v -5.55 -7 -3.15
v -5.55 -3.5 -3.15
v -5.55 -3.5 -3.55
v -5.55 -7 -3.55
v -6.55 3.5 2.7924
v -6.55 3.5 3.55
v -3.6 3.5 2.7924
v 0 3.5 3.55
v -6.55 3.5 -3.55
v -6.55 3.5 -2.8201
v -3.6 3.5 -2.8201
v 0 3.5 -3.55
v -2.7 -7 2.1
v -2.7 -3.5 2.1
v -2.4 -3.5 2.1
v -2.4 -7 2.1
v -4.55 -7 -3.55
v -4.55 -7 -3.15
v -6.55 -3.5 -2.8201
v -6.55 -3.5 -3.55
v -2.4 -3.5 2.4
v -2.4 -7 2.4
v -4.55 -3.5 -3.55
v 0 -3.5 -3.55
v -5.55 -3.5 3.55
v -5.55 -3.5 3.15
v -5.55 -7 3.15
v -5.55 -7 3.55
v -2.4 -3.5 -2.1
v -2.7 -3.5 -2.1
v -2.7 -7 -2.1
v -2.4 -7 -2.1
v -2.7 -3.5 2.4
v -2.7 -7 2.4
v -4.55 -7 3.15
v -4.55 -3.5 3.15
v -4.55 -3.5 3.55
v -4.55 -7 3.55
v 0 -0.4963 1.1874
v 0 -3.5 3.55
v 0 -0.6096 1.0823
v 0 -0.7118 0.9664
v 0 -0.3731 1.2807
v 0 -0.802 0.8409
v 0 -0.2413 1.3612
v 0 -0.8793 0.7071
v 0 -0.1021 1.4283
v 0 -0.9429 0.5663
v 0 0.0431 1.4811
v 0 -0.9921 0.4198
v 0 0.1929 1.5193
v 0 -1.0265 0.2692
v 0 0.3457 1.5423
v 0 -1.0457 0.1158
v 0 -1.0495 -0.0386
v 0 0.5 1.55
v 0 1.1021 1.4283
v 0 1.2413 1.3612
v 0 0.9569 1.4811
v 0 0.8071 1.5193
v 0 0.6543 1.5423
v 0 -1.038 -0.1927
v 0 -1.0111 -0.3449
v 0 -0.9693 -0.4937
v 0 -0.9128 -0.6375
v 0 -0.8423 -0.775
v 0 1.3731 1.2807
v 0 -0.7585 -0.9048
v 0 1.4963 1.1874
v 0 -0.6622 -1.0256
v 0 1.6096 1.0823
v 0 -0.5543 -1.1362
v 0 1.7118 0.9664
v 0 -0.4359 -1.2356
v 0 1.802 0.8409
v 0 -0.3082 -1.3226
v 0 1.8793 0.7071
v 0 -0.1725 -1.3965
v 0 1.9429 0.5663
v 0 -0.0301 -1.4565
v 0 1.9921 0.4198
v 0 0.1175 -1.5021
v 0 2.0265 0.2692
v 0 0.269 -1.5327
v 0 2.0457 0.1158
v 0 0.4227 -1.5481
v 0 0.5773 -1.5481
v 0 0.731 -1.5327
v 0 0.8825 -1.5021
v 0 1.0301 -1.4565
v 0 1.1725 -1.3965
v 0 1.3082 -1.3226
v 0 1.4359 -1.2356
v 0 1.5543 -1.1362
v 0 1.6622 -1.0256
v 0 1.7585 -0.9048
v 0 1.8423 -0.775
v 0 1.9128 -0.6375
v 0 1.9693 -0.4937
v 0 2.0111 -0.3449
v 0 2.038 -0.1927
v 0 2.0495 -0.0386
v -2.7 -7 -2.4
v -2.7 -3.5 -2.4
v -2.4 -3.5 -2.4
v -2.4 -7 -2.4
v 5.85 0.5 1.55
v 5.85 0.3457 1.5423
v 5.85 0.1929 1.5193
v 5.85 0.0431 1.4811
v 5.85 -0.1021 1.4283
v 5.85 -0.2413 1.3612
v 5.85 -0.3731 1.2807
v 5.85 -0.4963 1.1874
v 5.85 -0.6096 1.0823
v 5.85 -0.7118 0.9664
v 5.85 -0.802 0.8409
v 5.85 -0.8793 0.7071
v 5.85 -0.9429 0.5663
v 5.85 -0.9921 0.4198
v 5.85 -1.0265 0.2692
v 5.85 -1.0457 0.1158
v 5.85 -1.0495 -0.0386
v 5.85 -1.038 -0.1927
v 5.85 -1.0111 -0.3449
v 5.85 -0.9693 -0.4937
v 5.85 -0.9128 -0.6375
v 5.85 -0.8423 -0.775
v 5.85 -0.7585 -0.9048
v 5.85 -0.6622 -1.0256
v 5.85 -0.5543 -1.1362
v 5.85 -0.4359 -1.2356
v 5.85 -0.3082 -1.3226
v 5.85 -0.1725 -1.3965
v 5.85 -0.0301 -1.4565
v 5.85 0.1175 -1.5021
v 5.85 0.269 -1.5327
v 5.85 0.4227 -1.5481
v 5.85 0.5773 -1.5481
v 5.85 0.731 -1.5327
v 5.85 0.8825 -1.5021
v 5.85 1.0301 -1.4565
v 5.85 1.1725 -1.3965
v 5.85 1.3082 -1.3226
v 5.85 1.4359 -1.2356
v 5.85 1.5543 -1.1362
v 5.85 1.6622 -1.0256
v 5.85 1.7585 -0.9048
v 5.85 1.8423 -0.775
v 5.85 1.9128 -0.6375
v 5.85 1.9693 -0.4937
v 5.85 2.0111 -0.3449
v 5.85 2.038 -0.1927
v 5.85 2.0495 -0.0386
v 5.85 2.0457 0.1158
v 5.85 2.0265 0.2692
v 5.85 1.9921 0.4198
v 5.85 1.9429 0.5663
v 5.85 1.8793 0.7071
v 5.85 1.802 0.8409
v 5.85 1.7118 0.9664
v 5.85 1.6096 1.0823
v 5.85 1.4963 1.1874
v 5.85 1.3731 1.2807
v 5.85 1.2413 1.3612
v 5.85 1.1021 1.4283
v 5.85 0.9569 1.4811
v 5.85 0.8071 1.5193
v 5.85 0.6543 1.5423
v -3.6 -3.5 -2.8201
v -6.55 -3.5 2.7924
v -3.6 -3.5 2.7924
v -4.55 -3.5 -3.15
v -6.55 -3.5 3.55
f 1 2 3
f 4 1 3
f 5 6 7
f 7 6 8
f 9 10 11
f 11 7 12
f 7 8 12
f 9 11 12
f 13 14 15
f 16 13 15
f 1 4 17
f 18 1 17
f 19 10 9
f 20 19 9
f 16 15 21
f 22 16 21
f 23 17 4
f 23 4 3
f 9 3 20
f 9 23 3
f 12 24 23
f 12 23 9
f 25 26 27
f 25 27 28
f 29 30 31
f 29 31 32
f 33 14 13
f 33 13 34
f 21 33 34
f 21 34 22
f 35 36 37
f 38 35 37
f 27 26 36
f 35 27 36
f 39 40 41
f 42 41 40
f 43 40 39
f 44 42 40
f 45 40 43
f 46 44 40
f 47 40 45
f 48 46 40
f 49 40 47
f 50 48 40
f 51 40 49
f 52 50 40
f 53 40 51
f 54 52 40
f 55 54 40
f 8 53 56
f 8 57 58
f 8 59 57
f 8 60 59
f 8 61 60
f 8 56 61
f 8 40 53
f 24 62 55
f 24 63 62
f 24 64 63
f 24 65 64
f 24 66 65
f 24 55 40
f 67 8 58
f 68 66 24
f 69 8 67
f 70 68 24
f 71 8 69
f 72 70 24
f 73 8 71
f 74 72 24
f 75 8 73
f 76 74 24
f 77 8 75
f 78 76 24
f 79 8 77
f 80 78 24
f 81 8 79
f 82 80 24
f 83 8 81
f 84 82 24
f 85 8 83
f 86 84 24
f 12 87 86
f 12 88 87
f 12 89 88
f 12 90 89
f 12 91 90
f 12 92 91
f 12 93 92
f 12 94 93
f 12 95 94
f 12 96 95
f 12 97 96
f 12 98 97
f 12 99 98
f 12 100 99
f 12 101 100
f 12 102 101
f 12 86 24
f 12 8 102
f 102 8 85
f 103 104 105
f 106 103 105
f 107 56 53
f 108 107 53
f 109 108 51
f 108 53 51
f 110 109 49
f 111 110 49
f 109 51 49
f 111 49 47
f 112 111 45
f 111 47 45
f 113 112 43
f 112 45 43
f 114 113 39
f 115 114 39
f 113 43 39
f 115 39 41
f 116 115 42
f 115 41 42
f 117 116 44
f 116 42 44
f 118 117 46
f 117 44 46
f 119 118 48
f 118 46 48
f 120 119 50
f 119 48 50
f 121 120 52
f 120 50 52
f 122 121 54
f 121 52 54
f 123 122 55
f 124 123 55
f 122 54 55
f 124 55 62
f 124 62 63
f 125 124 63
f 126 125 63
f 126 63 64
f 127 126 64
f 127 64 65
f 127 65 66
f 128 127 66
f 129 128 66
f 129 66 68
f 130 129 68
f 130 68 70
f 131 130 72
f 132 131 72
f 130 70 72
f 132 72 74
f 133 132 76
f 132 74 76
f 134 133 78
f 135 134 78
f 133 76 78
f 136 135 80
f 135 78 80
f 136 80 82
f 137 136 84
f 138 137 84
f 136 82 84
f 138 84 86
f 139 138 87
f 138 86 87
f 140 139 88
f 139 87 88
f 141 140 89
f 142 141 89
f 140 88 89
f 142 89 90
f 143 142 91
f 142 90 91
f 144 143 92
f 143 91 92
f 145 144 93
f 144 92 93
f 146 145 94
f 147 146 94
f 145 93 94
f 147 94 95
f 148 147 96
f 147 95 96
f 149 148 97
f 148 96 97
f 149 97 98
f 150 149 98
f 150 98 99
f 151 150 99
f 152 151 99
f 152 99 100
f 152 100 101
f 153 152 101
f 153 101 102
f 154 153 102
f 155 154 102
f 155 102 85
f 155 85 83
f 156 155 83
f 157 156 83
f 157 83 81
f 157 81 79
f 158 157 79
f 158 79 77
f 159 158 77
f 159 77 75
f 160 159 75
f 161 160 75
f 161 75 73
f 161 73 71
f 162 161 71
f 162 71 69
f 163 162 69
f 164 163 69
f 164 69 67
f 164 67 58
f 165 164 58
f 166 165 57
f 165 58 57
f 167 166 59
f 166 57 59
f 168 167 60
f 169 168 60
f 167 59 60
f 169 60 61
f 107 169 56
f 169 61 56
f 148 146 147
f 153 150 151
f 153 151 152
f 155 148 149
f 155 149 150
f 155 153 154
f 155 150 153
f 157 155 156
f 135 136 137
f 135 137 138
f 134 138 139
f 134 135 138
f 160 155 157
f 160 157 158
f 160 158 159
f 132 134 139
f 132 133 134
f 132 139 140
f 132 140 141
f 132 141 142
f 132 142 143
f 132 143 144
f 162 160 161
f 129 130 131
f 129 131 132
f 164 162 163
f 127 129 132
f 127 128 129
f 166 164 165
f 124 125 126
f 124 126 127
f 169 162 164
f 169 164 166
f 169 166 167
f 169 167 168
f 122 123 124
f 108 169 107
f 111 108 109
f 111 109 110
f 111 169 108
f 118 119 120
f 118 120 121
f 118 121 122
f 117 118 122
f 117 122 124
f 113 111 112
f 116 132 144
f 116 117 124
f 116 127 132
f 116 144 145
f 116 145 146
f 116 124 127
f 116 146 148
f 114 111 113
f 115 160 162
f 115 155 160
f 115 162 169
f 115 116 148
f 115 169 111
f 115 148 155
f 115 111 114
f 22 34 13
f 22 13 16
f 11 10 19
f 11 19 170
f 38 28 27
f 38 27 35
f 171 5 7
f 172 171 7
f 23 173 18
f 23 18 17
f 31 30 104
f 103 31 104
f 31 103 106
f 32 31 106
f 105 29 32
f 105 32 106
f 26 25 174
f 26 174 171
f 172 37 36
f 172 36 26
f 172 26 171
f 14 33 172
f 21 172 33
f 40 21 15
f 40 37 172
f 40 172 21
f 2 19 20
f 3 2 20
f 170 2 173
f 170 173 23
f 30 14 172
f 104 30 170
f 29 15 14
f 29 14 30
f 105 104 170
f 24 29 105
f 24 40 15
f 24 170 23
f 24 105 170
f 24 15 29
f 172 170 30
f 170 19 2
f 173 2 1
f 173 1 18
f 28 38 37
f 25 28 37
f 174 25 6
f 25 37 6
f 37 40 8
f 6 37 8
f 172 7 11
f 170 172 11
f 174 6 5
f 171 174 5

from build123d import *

# Parameters (mm, degrees)
SKETCH1_W           = 7.1
SKETCH1_H           = 7
BOSS_EXTRUDE1_DEPTH = 6.55
SKETCH2_W           = 0.3
SKETCH2_H           = 0.3
SKETCH2_W_2         = 1
SKETCH2_H_2         = 0.4
BOSS_EXTRUDE2_DEPTH = 3.5
SKETCH3_W           = 2.95
SKETCH3_H           = 5.612486488
CUT_EXTRUDE1_DEPTH  = 13.874587372
SKETCH4_R           = 1.55
BOSS_EXTRUDE3_DEPTH = 5.85


with BuildPart() as part:
    # Sketch1 → Boss-Extrude1 (new body)
    with BuildSketch(Plane(origin=(0, 0, 0), x_dir=(0, 0, -1), z_dir=(1, 0, 0))):
        Rectangle(SKETCH1_W, SKETCH1_H)
    extrude(amount=-BOSS_EXTRUDE1_DEPTH)

    # Sketch2 → Boss-Extrude2 (add)
    with BuildSketch(Plane.XZ.offset(3.5)):
        with Locations((-2.55, 2.25)):
            Rectangle(SKETCH2_W, SKETCH2_H)
        with Locations((-5.05, 3.35)):
            Rectangle(SKETCH2_W_2, SKETCH2_H_2)
    boss_extrude2 = extrude(amount=BOSS_EXTRUDE2_DEPTH)

    # Mirror1: Boss-Extrude2 across plane
    add(boss_extrude2.mirror(Plane.XY))

    # Sketch3 → Cut-Extrude1 (cut, through all)
    with BuildSketch(Plane(origin=(0, 3.5, 0), x_dir=(1, 0, 0), z_dir=(0, 1, 0))):
        with Locations((-5.075, 0.013867293)):
            Rectangle(SKETCH3_W, SKETCH3_H)
    extrude(amount=-CUT_EXTRUDE1_DEPTH, mode=Mode.SUBTRACT)

    # Sketch4 → Boss-Extrude3 (add)
    with BuildSketch(Plane(origin=(0, 0, 0), x_dir=(0, 0, -1), z_dir=(1, 0, 0))):
        with Locations(Location((0, 0.5, 0), (0, 0, 180))):
            Circle(SKETCH4_R)
    extrude(amount=BOSS_EXTRUDE3_DEPTH)


solid = part.part
